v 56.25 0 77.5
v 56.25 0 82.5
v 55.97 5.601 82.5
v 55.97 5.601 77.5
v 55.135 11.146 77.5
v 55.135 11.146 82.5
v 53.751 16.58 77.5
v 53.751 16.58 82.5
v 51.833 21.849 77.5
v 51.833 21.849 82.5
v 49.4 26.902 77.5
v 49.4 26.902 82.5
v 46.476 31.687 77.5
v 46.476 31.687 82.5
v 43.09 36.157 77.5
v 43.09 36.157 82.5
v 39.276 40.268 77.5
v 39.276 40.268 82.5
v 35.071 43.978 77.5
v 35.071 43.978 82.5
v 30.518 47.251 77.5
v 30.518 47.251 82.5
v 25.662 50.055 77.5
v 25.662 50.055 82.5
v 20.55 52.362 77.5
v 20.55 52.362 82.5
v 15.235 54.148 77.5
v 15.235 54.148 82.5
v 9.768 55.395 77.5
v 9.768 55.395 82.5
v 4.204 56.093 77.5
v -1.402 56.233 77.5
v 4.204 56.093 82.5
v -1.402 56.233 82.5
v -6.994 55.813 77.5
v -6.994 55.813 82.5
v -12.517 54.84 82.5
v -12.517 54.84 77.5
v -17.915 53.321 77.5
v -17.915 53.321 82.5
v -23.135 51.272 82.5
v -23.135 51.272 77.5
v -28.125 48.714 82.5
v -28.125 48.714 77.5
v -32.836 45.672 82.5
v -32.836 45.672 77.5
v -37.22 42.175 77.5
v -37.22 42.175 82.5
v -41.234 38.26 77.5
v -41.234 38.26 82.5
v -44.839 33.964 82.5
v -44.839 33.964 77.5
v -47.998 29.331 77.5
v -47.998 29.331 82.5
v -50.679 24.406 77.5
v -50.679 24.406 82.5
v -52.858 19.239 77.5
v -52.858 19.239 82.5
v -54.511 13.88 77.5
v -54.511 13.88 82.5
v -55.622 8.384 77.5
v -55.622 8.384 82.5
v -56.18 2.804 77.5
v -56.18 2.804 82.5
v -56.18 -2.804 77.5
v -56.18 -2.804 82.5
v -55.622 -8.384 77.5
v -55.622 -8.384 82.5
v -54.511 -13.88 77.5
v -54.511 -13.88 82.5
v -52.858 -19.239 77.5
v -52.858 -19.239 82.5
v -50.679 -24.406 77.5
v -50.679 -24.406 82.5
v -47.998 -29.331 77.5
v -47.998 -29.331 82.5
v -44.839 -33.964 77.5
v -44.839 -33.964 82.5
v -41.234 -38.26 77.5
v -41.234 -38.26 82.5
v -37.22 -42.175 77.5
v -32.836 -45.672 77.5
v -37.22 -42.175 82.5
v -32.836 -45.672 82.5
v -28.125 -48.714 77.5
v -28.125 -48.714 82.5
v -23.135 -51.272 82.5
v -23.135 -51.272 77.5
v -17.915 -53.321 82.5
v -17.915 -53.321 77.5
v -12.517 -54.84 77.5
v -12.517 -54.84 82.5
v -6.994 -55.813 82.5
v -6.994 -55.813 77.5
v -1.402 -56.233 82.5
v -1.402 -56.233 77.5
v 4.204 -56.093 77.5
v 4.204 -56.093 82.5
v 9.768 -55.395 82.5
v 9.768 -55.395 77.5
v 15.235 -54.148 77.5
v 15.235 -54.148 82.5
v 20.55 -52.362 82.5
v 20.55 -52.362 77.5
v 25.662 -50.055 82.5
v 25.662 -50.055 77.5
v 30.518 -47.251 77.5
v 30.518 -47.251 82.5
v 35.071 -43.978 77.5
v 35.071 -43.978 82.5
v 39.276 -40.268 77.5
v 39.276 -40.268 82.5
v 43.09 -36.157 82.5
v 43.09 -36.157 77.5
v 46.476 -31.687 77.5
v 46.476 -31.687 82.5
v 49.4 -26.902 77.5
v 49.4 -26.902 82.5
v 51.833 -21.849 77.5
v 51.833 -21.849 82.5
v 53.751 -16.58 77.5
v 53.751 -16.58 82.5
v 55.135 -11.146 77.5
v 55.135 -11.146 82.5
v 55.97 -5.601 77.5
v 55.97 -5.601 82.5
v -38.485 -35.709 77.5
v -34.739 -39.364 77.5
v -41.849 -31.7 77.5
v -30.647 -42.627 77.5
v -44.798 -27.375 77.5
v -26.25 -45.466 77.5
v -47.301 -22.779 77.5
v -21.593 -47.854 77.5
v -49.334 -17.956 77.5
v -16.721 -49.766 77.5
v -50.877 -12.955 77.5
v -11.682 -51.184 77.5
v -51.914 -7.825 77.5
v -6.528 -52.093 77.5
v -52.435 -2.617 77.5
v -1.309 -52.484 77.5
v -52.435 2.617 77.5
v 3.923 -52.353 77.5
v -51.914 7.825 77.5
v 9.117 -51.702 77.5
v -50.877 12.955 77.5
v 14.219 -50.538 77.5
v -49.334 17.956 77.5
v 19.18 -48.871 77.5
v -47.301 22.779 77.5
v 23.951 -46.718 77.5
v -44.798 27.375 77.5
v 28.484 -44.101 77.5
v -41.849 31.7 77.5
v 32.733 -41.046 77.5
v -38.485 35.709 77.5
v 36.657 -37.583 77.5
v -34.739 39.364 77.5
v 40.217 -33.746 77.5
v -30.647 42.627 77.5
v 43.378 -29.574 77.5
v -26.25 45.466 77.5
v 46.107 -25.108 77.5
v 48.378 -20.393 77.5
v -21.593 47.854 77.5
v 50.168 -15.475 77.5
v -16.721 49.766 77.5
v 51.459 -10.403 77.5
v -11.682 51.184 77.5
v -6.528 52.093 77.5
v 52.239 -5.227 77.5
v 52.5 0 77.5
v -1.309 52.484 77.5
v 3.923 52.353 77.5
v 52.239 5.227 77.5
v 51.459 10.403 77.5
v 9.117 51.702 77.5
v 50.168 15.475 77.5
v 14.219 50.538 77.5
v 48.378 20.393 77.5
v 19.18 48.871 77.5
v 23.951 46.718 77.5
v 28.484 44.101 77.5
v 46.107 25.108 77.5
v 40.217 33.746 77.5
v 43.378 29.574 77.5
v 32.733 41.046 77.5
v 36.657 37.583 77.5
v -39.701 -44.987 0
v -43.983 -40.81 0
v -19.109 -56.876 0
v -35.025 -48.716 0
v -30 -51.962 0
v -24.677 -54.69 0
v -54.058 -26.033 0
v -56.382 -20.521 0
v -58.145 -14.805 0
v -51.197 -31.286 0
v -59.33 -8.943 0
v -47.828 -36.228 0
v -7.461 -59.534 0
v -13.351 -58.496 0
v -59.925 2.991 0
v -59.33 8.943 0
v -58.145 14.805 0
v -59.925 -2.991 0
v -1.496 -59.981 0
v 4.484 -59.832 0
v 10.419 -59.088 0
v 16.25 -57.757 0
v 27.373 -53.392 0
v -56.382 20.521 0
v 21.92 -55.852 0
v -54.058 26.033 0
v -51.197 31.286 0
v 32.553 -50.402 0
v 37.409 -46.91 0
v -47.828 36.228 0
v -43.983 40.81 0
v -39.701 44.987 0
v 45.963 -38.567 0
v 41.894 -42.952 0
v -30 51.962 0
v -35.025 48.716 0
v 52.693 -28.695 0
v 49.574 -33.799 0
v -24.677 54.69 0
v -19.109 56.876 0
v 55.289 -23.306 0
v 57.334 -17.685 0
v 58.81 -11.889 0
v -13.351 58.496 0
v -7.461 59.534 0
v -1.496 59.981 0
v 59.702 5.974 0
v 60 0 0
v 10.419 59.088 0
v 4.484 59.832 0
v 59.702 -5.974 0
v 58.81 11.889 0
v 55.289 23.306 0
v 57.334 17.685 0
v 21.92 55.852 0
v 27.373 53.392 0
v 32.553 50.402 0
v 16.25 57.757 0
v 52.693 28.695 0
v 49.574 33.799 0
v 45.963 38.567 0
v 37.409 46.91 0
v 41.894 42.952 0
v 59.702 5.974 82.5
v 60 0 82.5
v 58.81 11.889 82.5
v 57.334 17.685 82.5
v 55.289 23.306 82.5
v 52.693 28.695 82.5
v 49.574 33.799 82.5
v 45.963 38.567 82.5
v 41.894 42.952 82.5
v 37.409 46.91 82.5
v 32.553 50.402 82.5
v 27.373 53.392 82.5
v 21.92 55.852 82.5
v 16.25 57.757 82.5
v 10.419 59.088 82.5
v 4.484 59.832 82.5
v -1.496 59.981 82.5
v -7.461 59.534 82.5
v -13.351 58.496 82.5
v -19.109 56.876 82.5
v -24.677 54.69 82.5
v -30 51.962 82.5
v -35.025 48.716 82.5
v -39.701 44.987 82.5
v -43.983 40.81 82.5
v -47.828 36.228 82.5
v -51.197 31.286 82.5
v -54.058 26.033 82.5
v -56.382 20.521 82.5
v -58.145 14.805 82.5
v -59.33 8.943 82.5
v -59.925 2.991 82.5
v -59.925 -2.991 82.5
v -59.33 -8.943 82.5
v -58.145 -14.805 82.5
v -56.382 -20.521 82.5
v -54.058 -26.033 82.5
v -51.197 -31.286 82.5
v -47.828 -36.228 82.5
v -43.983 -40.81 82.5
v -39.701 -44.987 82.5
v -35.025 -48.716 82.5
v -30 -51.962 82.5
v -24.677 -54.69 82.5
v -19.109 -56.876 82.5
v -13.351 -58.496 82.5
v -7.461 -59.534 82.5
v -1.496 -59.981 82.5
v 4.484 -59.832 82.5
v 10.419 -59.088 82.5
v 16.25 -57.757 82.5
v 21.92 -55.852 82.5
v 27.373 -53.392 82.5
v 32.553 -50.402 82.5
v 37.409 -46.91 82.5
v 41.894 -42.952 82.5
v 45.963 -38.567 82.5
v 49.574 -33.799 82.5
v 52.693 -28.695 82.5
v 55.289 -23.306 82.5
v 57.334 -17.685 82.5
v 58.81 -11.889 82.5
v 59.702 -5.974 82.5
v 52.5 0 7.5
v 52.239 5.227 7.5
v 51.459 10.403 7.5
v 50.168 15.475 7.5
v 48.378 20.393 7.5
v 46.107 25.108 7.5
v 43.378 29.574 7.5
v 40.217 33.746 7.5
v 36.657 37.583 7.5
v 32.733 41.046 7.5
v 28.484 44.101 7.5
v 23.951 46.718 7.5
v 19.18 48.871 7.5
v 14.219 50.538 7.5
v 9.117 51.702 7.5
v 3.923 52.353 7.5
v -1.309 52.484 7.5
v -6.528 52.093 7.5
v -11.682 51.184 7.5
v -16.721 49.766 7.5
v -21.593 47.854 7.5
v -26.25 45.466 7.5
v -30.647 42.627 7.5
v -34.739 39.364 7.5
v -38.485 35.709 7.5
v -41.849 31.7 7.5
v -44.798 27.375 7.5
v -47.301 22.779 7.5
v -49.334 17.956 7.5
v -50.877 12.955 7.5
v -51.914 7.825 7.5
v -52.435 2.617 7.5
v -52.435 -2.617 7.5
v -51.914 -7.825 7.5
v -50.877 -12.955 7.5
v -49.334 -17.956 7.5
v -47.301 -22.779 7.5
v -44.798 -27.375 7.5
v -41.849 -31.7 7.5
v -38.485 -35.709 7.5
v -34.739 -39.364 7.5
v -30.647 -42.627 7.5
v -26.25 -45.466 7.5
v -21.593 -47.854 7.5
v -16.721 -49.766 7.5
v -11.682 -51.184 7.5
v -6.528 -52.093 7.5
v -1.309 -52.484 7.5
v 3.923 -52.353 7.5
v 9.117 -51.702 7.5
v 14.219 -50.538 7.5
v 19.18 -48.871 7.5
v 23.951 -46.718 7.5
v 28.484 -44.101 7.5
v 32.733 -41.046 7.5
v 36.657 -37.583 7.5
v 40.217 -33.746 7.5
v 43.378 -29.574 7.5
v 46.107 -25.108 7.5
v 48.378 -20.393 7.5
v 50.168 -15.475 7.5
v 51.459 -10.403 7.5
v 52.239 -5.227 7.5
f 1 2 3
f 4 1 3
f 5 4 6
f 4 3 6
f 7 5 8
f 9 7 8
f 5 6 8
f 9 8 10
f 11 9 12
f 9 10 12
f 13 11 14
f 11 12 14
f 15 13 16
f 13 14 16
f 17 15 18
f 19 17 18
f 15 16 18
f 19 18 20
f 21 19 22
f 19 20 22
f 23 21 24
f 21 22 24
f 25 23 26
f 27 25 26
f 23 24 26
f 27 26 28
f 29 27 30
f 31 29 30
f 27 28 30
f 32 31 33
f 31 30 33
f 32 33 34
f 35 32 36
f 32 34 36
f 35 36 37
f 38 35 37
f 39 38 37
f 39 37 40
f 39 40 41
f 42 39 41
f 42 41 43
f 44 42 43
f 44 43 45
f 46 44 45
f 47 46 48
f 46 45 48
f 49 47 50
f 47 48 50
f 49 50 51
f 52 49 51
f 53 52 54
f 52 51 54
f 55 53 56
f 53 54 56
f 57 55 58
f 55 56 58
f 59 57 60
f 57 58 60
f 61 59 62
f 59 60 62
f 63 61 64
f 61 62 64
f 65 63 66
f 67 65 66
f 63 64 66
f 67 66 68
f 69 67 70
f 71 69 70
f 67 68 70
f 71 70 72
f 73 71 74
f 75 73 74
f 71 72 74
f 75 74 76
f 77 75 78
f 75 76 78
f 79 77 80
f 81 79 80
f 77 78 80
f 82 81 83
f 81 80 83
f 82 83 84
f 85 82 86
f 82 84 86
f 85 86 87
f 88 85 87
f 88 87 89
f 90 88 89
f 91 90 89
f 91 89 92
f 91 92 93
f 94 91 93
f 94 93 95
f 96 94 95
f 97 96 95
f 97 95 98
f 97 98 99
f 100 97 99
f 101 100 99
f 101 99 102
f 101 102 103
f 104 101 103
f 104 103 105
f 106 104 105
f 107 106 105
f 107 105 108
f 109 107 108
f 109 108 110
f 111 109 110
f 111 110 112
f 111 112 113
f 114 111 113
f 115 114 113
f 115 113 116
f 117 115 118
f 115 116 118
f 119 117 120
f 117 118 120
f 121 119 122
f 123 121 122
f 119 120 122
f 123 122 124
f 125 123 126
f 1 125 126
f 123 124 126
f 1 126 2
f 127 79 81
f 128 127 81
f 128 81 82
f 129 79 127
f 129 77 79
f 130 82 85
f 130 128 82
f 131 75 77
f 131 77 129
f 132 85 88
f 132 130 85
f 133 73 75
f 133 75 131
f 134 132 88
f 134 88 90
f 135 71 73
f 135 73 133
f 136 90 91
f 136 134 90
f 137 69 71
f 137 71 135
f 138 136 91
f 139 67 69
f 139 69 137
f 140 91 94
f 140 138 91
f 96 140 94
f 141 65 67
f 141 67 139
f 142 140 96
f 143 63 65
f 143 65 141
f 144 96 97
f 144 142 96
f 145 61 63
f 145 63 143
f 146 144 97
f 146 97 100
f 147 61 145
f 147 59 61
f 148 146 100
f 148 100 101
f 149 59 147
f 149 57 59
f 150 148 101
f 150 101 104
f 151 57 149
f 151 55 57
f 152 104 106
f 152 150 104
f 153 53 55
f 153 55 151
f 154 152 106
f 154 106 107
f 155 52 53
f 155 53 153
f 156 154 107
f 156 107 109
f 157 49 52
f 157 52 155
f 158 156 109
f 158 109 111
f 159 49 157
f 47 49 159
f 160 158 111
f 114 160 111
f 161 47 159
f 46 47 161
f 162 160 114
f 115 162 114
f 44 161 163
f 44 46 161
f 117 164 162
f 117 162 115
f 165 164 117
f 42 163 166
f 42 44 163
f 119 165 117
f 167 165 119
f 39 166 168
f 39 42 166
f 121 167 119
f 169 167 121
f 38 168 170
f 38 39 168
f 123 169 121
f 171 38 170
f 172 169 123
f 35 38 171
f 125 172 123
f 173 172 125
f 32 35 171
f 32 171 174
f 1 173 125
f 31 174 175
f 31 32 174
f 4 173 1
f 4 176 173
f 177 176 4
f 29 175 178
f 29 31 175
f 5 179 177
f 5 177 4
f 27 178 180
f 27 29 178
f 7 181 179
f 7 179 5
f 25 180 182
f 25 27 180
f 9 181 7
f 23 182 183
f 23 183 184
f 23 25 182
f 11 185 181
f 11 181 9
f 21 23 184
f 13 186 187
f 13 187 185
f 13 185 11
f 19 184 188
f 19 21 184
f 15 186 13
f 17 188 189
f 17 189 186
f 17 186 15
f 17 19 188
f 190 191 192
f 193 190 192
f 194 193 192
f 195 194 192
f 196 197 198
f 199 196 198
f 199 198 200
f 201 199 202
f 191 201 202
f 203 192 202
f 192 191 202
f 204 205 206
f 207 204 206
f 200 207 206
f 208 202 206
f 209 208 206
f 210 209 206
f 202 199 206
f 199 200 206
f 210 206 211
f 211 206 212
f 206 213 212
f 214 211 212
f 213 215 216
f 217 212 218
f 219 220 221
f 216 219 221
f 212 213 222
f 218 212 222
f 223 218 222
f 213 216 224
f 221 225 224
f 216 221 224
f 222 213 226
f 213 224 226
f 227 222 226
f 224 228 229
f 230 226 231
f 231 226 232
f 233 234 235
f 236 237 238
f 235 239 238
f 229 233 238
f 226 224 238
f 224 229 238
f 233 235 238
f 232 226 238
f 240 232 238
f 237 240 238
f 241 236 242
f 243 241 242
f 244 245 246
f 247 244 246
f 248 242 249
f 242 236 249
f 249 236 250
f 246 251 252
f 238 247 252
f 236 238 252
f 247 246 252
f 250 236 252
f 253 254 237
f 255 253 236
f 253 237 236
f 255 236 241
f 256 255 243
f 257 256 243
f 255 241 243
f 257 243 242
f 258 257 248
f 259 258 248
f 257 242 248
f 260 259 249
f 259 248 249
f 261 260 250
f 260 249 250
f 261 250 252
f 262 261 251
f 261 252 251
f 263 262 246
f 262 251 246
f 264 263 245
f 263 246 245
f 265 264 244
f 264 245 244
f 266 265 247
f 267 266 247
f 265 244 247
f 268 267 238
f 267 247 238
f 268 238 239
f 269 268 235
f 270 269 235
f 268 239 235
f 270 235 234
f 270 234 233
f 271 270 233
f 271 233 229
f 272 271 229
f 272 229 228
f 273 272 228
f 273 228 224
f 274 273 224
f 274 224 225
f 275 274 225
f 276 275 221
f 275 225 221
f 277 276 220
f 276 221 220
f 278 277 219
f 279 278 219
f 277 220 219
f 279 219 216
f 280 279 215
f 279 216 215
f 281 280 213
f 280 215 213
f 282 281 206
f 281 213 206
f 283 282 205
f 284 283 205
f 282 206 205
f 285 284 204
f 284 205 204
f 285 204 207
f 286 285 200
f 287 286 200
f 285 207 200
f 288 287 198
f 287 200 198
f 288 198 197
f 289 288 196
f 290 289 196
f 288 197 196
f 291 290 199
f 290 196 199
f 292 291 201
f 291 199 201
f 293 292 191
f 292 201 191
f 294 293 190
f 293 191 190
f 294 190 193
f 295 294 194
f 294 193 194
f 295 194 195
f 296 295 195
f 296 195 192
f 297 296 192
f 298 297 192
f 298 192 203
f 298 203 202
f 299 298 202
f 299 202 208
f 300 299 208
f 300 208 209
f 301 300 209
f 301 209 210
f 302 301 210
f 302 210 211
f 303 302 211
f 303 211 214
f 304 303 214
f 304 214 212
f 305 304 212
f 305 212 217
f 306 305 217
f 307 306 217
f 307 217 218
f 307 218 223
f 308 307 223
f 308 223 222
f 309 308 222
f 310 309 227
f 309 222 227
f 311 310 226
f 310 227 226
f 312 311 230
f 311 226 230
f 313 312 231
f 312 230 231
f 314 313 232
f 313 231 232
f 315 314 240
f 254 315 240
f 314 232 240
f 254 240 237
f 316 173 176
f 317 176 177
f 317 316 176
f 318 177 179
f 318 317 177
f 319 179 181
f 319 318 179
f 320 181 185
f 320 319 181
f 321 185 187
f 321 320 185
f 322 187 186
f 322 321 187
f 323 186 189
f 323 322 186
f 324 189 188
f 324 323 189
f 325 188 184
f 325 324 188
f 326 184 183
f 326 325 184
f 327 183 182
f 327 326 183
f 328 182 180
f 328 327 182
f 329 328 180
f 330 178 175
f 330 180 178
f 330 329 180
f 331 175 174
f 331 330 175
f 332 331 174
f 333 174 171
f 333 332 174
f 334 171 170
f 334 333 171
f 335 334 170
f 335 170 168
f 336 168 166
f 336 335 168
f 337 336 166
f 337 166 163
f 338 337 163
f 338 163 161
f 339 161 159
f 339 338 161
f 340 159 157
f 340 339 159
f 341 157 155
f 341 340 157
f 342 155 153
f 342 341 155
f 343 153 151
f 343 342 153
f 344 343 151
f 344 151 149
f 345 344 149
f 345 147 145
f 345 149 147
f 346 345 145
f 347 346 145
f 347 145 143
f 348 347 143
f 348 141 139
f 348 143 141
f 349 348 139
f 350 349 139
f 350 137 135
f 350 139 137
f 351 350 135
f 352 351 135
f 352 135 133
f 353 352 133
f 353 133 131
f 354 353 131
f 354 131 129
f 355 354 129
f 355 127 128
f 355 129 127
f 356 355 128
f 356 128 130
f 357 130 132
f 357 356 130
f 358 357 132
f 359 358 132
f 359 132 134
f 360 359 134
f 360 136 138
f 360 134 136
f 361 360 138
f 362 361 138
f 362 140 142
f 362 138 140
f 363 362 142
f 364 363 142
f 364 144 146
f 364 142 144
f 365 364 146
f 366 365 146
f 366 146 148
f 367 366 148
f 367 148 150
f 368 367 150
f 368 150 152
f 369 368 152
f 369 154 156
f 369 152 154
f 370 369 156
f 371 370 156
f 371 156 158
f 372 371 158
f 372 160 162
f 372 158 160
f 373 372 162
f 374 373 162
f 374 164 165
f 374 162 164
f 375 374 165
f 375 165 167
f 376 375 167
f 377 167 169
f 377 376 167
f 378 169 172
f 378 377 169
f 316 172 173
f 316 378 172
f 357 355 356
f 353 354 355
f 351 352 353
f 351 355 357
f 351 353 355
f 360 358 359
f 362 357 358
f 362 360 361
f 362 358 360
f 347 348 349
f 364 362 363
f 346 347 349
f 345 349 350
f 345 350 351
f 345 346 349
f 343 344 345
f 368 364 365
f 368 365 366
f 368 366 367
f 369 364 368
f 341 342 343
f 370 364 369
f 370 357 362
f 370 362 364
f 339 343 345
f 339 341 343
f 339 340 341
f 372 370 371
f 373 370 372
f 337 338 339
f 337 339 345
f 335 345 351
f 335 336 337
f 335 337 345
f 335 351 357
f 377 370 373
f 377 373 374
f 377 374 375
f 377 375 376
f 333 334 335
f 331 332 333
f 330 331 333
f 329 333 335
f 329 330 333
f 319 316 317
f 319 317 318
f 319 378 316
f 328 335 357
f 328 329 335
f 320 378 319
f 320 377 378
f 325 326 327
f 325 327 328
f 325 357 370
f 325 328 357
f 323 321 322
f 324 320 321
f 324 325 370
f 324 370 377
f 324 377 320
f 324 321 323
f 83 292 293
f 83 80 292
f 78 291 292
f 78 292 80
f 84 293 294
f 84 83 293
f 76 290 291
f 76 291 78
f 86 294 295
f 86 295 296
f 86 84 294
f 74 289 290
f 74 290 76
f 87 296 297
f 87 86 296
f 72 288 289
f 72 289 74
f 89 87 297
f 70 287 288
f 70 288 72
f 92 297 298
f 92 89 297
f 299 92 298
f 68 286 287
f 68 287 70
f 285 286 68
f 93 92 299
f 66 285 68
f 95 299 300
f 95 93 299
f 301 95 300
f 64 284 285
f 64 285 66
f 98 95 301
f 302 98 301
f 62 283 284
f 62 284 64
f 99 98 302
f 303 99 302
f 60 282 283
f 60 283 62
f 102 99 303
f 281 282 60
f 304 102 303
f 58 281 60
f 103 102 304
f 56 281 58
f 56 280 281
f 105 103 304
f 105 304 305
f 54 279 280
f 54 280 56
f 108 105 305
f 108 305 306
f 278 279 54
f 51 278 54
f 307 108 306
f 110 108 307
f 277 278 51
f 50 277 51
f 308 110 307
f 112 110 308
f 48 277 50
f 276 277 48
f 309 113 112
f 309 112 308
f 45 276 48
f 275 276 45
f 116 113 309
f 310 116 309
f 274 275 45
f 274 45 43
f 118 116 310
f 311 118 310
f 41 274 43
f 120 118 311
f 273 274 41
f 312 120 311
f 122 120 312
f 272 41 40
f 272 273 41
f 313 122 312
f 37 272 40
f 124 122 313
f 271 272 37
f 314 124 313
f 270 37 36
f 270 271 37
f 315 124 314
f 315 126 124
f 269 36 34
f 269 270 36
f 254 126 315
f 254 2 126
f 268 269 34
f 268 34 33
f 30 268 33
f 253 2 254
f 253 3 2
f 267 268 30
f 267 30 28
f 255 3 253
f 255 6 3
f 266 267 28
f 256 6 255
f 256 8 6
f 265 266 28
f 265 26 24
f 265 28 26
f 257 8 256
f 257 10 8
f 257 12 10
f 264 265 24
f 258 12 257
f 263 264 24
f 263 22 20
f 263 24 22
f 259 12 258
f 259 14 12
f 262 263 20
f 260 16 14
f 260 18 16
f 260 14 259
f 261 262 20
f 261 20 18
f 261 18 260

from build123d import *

# Parameters (mm, degrees)
F0_R     = 60
F1_DEPTH = 7.5
F2_R     = 60
F2_R_2   = 52.5
F3_DEPTH = 75
F4_R     = 56.25
F5_DEPTH = 5


with BuildPart() as f1:
    # F0 (on Top) → F1 (new body)
    with BuildSketch(Plane.XY):
        Circle(F0_R)
    extrude(amount=F1_DEPTH)

    # F2 (on face) → F3 (join)
    with BuildSketch(Plane.XY.offset(7.5)):
        Circle(F2_R)
        Circle(F2_R_2, mode=Mode.SUBTRACT)
    extrude(amount=F3_DEPTH)

    # F4 (on face) → F5 (cut)
    with BuildSketch(Plane.XY.offset(82.5)):
        Circle(F4_R)
    extrude(amount=-F5_DEPTH, mode=Mode.SUBTRACT)


solid = f1.part
